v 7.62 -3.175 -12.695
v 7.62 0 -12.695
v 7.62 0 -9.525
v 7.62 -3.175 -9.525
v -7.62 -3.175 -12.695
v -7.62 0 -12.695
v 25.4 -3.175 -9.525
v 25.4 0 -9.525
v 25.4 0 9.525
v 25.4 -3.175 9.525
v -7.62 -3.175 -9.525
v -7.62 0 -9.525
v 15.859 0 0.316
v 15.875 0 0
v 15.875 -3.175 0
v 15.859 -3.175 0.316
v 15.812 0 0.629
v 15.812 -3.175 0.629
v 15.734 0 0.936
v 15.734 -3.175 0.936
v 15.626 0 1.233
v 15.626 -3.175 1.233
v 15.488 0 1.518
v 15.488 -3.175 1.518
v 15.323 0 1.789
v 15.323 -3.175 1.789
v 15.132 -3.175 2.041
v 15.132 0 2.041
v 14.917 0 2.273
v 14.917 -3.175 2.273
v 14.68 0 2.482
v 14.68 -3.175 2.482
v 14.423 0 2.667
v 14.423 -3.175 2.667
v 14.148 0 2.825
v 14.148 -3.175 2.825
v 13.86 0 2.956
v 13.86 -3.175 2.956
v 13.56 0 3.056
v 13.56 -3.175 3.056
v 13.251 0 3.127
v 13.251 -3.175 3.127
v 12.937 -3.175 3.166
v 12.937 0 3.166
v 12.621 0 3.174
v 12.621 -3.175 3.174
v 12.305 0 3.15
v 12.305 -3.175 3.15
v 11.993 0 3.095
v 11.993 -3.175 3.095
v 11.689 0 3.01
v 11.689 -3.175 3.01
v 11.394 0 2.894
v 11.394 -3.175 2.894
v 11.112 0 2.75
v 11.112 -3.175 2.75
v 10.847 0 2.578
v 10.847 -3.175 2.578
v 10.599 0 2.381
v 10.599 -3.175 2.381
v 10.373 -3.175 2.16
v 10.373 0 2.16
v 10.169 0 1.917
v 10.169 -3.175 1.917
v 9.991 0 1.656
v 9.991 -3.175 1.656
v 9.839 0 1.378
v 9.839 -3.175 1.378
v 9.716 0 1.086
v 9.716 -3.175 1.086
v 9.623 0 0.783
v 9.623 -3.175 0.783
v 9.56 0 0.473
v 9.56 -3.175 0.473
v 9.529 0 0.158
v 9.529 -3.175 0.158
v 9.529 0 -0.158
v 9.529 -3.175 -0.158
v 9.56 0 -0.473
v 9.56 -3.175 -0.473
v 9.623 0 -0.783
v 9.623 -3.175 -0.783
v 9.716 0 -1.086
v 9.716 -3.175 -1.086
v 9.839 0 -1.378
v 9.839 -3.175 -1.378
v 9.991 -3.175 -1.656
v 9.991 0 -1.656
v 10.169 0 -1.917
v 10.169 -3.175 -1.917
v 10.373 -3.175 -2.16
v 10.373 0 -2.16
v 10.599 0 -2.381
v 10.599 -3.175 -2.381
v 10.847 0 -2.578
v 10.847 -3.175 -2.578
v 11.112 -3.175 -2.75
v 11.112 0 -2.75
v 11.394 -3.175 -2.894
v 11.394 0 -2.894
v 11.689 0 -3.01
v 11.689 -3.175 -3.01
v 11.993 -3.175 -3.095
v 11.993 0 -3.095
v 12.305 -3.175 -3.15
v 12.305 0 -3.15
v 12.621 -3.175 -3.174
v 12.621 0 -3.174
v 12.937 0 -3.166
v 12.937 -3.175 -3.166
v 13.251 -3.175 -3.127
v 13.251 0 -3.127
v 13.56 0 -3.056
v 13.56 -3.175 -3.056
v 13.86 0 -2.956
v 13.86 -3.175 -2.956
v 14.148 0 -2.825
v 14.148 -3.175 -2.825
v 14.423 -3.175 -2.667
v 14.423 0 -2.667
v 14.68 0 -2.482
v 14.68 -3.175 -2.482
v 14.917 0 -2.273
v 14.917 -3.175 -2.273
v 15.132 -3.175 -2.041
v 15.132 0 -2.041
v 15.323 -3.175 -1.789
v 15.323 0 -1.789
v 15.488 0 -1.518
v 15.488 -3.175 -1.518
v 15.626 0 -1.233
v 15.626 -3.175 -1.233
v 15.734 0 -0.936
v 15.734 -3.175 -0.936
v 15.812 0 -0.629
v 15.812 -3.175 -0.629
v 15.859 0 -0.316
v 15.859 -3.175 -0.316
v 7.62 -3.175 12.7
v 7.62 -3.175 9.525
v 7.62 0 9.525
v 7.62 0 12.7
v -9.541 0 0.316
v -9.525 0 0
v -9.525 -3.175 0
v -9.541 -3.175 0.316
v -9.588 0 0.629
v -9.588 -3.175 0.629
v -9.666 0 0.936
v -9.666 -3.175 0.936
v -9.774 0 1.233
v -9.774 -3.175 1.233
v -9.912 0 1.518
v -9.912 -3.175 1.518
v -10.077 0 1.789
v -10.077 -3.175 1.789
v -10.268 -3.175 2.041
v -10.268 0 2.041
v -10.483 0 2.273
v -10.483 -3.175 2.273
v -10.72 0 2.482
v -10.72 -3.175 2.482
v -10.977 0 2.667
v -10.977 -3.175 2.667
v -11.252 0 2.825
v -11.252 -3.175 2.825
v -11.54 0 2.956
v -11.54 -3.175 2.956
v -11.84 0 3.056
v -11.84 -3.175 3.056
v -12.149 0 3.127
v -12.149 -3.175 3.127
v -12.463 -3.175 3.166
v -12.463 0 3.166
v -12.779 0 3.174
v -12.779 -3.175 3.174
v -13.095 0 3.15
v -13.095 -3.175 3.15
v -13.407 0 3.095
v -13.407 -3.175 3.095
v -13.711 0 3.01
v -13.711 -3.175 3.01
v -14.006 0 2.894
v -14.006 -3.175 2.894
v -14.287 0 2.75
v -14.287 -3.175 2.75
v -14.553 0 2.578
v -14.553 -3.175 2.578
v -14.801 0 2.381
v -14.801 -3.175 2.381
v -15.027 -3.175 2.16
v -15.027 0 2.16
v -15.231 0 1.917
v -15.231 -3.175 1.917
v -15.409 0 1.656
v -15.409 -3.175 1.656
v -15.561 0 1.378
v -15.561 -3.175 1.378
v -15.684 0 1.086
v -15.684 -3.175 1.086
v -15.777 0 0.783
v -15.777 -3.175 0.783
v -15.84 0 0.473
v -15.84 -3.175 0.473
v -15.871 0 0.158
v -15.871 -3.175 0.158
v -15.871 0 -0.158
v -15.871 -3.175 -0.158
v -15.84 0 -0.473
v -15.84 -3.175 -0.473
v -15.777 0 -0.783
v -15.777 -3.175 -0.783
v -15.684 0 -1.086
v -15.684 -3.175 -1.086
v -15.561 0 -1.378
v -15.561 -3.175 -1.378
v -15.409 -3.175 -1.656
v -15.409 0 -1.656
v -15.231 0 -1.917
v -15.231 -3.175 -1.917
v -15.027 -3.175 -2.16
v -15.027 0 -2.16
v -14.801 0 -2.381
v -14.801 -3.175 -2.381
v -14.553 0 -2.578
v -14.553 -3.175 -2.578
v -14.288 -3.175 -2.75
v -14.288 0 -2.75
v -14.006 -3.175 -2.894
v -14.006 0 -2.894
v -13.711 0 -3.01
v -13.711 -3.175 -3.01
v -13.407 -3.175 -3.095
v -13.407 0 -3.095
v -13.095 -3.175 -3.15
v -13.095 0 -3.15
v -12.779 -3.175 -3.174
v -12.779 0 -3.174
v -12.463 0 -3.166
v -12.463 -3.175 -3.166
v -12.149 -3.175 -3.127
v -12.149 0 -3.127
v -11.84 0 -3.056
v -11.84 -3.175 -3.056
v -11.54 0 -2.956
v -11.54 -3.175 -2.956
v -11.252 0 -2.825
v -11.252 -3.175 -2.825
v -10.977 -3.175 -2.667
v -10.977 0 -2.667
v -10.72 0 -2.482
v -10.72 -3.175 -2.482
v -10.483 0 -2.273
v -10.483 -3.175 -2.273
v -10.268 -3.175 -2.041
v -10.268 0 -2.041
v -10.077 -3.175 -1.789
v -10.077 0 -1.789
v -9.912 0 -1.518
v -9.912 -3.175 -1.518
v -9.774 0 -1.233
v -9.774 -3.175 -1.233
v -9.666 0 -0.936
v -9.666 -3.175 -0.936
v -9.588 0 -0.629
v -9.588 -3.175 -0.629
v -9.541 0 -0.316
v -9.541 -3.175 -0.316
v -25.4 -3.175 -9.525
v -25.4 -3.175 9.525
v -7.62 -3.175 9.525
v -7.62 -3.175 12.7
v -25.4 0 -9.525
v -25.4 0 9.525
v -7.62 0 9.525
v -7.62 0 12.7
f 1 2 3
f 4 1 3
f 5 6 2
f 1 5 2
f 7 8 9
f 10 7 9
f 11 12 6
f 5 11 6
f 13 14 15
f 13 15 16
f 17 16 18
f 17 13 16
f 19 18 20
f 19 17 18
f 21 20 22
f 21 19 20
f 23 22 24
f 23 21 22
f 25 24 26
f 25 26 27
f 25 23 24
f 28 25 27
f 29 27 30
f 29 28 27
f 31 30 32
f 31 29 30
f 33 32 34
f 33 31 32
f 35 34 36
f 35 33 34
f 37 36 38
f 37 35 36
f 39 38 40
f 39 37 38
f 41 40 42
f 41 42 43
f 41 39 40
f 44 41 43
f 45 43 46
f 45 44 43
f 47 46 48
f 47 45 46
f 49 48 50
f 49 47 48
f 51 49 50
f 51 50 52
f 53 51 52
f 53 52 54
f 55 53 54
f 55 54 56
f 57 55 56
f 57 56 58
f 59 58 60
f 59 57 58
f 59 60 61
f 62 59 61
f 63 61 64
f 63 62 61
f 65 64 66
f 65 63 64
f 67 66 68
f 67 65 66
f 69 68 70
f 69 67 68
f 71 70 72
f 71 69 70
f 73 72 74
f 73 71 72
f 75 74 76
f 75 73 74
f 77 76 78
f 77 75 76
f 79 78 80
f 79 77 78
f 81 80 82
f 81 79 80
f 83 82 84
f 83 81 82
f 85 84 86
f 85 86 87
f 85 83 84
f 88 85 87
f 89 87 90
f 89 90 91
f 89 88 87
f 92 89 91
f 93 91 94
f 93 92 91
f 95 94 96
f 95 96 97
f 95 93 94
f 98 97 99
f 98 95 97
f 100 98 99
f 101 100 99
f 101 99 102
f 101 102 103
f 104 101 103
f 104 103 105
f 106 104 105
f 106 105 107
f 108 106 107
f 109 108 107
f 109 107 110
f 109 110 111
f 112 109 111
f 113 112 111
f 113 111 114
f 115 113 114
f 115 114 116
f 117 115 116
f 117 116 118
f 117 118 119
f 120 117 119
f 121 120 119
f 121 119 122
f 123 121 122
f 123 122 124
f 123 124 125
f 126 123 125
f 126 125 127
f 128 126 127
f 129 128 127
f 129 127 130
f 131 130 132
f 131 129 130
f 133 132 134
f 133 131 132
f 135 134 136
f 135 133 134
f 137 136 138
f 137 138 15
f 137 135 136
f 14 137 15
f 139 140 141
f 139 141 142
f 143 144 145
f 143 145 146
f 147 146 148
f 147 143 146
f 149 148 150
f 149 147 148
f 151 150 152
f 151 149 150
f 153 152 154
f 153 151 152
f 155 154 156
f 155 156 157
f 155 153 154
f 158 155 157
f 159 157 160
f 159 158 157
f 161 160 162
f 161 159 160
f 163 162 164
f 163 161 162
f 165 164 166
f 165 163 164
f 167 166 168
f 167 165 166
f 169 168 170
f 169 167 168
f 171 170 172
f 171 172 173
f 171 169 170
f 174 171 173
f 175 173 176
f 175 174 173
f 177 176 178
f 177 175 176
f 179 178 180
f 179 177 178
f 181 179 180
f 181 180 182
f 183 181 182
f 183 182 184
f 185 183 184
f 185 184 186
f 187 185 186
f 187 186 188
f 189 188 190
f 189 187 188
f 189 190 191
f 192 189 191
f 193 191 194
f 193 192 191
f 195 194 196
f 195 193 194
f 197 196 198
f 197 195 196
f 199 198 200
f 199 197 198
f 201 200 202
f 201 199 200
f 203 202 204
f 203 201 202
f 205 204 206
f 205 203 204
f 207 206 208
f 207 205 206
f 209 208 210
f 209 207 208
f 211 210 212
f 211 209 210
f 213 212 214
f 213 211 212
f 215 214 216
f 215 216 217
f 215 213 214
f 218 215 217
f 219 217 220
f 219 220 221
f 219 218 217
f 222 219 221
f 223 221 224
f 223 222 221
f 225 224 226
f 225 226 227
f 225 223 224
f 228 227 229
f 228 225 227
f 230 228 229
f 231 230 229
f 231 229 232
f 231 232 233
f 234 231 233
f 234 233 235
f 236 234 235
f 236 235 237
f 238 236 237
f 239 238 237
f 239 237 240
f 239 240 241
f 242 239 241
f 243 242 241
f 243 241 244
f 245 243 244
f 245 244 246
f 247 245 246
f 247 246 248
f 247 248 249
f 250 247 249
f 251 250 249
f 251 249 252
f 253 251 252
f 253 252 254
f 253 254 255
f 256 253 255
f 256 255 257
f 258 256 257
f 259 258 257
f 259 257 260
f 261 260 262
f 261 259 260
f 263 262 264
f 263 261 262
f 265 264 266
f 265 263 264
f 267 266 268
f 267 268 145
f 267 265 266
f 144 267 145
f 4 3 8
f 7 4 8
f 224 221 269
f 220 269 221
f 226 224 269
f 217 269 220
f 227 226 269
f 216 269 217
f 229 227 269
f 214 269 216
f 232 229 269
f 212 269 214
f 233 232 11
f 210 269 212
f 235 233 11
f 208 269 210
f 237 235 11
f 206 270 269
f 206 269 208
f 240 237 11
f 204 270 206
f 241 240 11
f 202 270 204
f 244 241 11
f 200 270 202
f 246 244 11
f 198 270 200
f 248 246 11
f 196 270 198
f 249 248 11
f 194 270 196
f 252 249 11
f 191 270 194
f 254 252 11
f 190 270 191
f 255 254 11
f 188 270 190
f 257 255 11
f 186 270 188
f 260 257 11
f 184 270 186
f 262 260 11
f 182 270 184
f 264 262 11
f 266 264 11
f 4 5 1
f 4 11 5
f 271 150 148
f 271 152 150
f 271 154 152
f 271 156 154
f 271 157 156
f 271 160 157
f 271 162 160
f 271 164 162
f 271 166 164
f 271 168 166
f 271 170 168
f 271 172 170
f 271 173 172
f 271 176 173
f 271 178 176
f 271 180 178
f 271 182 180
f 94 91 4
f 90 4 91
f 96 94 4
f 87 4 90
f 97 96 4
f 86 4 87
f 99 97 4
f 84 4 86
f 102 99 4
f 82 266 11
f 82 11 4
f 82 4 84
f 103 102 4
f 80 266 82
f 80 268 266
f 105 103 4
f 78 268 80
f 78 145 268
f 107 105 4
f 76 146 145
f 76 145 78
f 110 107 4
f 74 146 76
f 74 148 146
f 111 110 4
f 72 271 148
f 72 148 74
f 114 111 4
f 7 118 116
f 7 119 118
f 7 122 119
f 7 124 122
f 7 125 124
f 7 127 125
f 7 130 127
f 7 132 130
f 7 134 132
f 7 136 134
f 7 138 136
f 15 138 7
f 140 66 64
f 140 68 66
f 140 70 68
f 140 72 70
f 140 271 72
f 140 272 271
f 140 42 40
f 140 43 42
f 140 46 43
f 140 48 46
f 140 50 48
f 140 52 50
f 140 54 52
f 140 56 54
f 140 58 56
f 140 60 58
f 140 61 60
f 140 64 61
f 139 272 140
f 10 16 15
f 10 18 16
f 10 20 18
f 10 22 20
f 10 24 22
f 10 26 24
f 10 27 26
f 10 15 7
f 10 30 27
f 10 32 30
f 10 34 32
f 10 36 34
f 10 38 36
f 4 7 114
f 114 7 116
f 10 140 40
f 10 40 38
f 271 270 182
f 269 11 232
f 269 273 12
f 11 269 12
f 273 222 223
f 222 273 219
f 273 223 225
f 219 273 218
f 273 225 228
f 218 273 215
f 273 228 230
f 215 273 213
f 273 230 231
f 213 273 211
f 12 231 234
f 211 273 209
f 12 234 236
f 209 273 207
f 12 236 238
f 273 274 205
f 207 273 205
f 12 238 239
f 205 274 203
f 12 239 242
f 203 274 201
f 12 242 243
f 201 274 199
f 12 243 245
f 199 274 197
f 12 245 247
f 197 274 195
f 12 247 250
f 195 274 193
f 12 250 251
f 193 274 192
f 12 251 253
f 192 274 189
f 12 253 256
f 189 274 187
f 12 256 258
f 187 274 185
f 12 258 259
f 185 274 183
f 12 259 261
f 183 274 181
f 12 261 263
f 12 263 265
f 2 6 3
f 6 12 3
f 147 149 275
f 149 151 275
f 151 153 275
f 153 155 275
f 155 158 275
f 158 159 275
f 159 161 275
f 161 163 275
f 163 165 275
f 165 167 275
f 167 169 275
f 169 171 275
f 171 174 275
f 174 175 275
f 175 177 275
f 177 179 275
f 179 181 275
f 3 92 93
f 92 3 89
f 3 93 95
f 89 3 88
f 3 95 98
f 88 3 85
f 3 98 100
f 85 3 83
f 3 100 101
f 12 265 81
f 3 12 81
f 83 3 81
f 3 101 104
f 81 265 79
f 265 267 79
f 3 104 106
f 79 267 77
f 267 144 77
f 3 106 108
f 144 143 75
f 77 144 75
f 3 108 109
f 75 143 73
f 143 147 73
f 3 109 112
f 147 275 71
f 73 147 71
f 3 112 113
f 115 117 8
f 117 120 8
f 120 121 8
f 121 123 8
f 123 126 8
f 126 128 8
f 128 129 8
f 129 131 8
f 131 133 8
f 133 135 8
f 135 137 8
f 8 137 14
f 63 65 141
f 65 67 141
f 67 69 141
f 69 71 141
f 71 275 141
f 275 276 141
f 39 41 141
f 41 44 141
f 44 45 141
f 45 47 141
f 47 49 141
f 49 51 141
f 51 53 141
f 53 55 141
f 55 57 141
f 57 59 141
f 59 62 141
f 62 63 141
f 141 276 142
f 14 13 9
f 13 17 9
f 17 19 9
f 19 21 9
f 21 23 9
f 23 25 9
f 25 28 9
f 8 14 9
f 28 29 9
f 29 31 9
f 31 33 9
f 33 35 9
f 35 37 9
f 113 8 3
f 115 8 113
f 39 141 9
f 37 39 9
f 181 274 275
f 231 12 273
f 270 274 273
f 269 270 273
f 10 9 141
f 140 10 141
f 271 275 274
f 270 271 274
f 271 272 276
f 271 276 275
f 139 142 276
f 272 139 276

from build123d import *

# Parameters (mm, degrees)
F0_R     = 3.175
F1_DEPTH = 3.175


with BuildPart() as f1:
    # F0 (on Front) → F1 (new body)
    with BuildSketch(Plane.XZ):
        Polygon((-7.62, -12.695253), (7.62, -12.695253), (7.62, -9.525), (25.4, -9.525), (25.4, -6.35), (25.4, 6.357342), (25.4, 9.525), (7.62, 9.525), (7.62, 12.7), (-7.62, 12.7), (-7.62, 9.525), (-25.4, 9.525), (-25.4, 6.355764), (-25.4, -6.35), (-25.4, -9.525), (-7.62, -9.525), align=None)
        with Locations((-12.7, 0)):
            Circle(F0_R, mode=Mode.SUBTRACT)
        with Locations((12.7, 0)):
            Circle(F0_R, mode=Mode.SUBTRACT)
    extrude(amount=F1_DEPTH)


solid = f1.part
